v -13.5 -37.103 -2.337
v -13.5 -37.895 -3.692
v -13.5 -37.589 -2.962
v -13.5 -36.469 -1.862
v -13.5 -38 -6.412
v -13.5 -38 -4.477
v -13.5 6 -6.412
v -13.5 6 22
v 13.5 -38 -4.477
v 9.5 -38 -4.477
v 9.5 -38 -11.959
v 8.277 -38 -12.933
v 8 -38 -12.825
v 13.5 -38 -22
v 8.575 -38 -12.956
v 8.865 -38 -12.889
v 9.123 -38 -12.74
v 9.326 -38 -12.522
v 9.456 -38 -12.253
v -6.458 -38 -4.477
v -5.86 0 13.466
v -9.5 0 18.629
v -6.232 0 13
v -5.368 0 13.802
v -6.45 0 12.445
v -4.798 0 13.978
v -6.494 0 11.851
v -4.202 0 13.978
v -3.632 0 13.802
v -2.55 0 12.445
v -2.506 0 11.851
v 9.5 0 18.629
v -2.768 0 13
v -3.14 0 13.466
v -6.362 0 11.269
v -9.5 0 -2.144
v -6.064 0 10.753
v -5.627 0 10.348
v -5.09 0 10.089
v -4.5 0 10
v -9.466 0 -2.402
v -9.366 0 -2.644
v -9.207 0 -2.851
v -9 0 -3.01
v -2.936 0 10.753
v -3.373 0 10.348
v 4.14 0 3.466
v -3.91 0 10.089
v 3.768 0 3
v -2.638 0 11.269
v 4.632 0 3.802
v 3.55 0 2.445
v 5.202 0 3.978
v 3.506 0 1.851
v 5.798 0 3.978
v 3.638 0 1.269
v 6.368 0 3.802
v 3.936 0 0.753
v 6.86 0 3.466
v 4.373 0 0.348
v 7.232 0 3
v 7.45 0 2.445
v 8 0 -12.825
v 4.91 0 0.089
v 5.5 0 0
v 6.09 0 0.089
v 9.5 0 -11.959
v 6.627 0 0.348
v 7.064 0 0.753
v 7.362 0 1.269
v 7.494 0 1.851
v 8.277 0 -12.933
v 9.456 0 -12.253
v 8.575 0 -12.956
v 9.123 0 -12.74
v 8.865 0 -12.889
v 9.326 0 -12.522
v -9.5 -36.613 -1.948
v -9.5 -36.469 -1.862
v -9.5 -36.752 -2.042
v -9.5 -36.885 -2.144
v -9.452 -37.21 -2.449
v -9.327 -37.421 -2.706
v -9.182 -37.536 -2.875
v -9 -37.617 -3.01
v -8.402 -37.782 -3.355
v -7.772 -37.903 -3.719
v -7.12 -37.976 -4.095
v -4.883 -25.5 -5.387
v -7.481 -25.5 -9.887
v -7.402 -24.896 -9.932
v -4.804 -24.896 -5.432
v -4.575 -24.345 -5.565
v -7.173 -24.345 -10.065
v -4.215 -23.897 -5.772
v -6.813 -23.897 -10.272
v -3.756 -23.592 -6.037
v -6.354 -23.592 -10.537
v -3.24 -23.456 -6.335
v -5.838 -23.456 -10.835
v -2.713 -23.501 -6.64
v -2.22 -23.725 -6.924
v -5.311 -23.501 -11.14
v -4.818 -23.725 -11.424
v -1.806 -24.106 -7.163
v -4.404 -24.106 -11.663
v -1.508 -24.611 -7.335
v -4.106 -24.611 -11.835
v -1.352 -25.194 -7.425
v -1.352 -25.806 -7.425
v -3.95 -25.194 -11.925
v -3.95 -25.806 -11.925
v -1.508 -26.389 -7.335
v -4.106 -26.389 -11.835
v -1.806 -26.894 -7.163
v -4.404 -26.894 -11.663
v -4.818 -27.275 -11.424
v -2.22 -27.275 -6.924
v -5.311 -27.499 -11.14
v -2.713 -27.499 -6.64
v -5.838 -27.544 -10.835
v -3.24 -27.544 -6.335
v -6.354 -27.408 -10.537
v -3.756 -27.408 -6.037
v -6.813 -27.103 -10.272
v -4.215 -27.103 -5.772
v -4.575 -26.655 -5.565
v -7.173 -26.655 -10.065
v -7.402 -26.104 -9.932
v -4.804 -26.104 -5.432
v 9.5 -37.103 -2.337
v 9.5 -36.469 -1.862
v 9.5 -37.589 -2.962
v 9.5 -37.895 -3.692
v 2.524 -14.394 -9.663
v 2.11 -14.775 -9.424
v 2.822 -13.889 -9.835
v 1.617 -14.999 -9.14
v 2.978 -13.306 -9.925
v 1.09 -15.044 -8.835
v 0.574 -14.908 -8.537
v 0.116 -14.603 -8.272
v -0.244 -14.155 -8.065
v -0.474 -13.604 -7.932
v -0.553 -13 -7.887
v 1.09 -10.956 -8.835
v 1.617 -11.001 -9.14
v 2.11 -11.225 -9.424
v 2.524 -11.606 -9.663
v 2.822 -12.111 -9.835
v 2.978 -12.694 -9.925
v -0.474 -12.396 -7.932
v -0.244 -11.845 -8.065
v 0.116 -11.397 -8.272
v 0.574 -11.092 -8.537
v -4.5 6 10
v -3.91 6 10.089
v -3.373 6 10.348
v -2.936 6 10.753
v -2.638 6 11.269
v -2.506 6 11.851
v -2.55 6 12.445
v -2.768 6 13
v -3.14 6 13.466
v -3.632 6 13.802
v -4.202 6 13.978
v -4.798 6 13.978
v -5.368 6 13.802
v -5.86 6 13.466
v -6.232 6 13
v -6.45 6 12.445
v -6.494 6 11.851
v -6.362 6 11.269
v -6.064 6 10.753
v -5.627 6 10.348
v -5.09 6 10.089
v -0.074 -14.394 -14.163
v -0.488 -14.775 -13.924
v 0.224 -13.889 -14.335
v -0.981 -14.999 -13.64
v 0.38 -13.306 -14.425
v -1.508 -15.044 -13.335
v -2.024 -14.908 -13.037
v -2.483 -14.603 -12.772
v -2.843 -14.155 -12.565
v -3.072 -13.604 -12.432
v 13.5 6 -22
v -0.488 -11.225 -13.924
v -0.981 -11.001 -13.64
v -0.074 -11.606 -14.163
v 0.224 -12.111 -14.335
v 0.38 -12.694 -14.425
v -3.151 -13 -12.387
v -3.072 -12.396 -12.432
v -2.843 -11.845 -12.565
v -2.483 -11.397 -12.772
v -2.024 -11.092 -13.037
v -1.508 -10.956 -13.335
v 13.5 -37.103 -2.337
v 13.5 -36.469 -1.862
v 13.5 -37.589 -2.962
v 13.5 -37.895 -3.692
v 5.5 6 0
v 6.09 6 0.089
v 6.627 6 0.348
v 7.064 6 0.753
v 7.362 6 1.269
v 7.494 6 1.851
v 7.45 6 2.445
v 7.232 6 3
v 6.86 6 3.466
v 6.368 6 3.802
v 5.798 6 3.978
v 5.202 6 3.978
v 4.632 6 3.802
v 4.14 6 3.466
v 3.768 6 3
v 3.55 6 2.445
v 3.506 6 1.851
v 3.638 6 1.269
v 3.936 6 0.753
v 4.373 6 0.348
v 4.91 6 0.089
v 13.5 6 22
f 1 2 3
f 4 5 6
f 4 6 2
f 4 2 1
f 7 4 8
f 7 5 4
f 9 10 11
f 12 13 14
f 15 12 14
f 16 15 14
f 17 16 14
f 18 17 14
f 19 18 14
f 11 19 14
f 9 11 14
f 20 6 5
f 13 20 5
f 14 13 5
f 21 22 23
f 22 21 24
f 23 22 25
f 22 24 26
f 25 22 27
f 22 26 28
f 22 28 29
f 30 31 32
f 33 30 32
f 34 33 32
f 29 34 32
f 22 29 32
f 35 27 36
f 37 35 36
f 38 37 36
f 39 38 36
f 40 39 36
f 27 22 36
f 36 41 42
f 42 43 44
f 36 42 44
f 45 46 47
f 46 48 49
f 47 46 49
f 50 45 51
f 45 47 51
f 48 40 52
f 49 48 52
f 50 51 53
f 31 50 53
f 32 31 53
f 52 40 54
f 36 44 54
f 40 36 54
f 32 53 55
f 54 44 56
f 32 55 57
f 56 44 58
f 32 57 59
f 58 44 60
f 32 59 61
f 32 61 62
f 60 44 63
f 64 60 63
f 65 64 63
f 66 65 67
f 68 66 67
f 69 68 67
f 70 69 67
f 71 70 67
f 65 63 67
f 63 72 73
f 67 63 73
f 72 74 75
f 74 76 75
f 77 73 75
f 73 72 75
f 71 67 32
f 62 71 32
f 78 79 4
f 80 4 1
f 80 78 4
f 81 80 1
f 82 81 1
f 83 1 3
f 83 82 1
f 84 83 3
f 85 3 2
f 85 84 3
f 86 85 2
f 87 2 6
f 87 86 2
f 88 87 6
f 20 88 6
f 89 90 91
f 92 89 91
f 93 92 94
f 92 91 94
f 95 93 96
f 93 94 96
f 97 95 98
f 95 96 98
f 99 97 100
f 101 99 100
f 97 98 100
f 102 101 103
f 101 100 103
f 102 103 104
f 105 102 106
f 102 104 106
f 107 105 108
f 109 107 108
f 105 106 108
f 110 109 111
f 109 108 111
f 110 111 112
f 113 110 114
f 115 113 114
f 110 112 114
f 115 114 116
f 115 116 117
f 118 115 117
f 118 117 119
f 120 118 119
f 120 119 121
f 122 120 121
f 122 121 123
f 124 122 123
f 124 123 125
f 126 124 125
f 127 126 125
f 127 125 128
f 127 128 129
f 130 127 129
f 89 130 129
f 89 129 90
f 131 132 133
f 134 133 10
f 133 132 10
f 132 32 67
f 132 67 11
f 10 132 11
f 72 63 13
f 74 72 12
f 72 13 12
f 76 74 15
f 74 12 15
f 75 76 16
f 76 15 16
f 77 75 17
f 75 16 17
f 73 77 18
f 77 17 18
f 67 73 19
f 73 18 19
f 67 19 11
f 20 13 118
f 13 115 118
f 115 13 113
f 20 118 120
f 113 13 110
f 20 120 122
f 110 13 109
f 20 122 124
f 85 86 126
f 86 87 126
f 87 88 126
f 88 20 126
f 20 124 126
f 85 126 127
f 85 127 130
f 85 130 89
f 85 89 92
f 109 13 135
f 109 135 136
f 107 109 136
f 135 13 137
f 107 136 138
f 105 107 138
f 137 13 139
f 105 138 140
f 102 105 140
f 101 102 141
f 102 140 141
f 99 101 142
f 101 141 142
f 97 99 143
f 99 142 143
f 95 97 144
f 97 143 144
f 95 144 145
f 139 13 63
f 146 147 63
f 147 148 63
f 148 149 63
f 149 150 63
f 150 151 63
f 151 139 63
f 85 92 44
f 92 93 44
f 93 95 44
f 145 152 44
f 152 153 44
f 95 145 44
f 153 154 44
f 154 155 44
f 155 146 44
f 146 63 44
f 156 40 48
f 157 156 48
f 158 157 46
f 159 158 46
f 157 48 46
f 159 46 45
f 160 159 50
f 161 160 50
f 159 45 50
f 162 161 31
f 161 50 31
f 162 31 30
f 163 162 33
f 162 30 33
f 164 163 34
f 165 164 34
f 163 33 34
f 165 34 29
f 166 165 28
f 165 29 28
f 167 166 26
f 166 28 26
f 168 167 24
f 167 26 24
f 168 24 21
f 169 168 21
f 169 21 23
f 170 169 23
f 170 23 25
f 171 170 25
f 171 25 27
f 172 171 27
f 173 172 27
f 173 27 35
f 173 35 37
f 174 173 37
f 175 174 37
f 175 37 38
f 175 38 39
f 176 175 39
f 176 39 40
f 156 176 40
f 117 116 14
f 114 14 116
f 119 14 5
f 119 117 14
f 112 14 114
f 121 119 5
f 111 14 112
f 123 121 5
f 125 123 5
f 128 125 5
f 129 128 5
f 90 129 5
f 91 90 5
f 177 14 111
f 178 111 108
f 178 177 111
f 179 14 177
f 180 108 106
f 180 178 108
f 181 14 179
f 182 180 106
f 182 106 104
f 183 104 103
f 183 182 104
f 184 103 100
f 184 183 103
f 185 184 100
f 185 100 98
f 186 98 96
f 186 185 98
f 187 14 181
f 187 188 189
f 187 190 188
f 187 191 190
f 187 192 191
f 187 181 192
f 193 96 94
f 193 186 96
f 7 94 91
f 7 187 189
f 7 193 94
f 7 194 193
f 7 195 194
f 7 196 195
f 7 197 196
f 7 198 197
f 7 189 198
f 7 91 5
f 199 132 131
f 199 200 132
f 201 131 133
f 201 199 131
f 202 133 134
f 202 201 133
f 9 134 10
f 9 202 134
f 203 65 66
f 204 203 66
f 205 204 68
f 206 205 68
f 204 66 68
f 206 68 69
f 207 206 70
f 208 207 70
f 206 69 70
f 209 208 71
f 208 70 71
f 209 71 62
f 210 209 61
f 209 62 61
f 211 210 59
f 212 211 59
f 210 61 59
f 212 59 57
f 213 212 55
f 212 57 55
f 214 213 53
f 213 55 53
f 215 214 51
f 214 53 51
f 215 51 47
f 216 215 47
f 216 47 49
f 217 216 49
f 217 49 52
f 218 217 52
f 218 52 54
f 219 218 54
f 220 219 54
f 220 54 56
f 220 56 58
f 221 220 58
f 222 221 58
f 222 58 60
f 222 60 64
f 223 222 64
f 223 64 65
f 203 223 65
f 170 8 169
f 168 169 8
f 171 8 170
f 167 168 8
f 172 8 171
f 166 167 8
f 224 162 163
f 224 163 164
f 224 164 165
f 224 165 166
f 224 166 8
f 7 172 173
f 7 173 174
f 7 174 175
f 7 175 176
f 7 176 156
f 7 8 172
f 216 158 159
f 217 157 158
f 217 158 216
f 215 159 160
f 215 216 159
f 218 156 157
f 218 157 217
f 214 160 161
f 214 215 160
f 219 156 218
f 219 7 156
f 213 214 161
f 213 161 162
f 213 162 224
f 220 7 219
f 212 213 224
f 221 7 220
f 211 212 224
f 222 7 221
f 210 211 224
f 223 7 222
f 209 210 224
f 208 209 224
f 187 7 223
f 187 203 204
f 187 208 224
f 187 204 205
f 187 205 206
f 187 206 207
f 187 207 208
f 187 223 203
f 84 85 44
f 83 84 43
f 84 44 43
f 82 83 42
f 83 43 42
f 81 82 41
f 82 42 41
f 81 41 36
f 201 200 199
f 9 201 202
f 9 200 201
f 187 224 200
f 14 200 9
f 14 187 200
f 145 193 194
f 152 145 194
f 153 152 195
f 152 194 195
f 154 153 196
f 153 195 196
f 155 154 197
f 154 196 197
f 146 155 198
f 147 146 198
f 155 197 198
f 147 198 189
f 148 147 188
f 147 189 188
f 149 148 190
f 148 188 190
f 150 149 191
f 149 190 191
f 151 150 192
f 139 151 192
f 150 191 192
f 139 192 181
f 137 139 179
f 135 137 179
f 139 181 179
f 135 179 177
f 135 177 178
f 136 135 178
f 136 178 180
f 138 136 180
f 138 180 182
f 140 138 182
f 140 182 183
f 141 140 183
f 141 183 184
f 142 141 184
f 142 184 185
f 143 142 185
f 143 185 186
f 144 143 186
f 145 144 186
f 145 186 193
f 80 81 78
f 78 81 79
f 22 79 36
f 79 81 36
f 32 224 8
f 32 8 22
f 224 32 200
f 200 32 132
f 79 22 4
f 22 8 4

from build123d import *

# Parameters (mm, degrees)
SKETCH1_W           = 27
SKETCH1_H           = 44
BOSS_EXTRUDE1_DEPTH = 6
CUT_EXTRUDE1_DEPTH  = 27.5
BOSS_EXTRUDE2_DEPTH = 44
SKETCH4_R           = 2
CUT_EXTRUDE2_DEPTH  = 46.937457483
SKETCH7_R           = 2.05
CUT_EXTRUDE4_DEPTH  = 54.81893677
CUT_EXTRUDE6_DEPTH  = 52.546096044
FILLET1_R           = 1
FILLET2_R           = 3


with BuildPart() as part:
    # Sketch1 → Boss-Extrude1 (new body)
    with BuildSketch(Plane(origin=(0, 0, 0), x_dir=(1, 0, 0), z_dir=(0, 1, 0))):
        Rectangle(SKETCH1_W, SKETCH1_H)
    extrude(amount=BOSS_EXTRUDE1_DEPTH)

    # Sketch2 → Cut-Extrude1 (cut, through all)
    with BuildSketch(Plane(origin=(0, 6, 0), x_dir=(1, 0, 0), z_dir=(0, 1, 0))):
        Polygon((13.5, 22), (-13.5, 6.411542732), (-13.5, 22), align=None)
    extrude(amount=-CUT_EXTRUDE1_DEPTH, mode=Mode.SUBTRACT)

    # Sketch3 → Boss-Extrude2 (add)
    with BuildSketch(Plane(origin=(0, 6, 0), x_dir=(1, 0, 0), z_dir=(0, 1, 0))):
        Polygon((-13.5, 6.411542732), (13.5, 22), (13.5, 16), (-13.5, 0.411542732), align=None)
    extrude(amount=-BOSS_EXTRUDE2_DEPTH)

    # Sketch4 → Cut-Extrude2 (cut, through all)
    with BuildSketch(Plane.XZ):
        with Locations(Location((-4.5, 12, 0), (0, 0, 270))):
            Circle(SKETCH4_R)
        with Locations(Location((5.5, 2, 0), (0, 0, 270))):
            Circle(SKETCH4_R)
    extrude(amount=-CUT_EXTRUDE2_DEPTH, mode=Mode.SUBTRACT)

    # Sketch7 → Cut-Extrude4 (cut, through all)
    with BuildSketch(Plane(origin=(-6.151279442, 0, -10.654328524), x_dir=(-0.8660254037844417, 0, 0.49999999999999495), z_dir=(-0.49999999999999495, 0, -0.8660254037844417))):
        with Locations((-5.514428415, -13)):
            Circle(SKETCH7_R)
        with Locations((-0.514428415, -25.5)):
            Circle(SKETCH7_R)
    extrude(amount=-CUT_EXTRUDE4_DEPTH, mode=Mode.SUBTRACT)

    # Sketch15 → Loft5 section 0
    with BuildSketch(Plane(origin=(9.5, 0, 0), x_dir=(0, 0, -1), z_dir=(1, 0, 0))):
        with BuildLine():
            Line((-22, 0), (13.690598923, 0))
            Line((13.690598923, 0), (13.690598923, -38))
            Line((13.690598923, -38), (-22, -38))
            Line((-22, -38), (-22, 0))
        make_face()
    # Sketch17 → Loft5 section 1
    with BuildSketch(Plane(origin=(13.5, 0, 0), x_dir=(0, 0, -1), z_dir=(1, 0, 0))):
        with BuildLine():
            Line((-22, 0), (16, 0))
            Line((16, 0), (16, -38))
            Line((16, -38), (-22, -38))
            Line((-22, -38), (-22, 0))
        make_face()
    loft()

    # Sketch12 → Loft7 section 0
    with BuildSketch(Plane.ZY.offset(9.5)):
        with BuildLine():
            Line((-2.720943809, -38), (-2.720943809, 0))
            Line((-2.720943809, 0), (22, 0))
            Line((22, 0), (22, -38))
            Line((22, -38), (-2.720943809, -38))
        make_face()
    # Sketch20 → Loft7 section 1
    with BuildSketch(Plane.ZY.offset(13.5)):
        with BuildLine():
            Line((-0.411542732, 0), (22, 0))
            Line((22, 0), (22, -38))
            Line((22, -38), (-0.411542732, -38))
            Line((-0.411542732, -38), (-0.411542732, 0))
        make_face()
    loft()

    # Sketch22 → Cut-Extrude6 (cut, through all)
    with BuildSketch(Plane.ZY.offset(13.5)):
        Polygon((22, 6), (-2.721542732, -38), (22, -38), align=None)
    extrude(amount=-CUT_EXTRUDE6_DEPTH, mode=Mode.SUBTRACT)

    # Fillet1
    fillet1_edges = [part.edges().sort_by_distance(p)[0] for p in [
        (9.5, -19, -13.690598923),
        (-9.5, -18.999467011, -2.720943809),
    ]]
    fillet(fillet1_edges, radius=FILLET1_R)

    # Fillet2
    fillet2_edges = [part.edges().sort_by_distance(p)[0] for p in [
        (-11.408036374, -38, -2.721542732),
        (11.5, -38, -2.721542732),
    ]]
    fillet(fillet2_edges, radius=FILLET2_R)


solid = part.part
